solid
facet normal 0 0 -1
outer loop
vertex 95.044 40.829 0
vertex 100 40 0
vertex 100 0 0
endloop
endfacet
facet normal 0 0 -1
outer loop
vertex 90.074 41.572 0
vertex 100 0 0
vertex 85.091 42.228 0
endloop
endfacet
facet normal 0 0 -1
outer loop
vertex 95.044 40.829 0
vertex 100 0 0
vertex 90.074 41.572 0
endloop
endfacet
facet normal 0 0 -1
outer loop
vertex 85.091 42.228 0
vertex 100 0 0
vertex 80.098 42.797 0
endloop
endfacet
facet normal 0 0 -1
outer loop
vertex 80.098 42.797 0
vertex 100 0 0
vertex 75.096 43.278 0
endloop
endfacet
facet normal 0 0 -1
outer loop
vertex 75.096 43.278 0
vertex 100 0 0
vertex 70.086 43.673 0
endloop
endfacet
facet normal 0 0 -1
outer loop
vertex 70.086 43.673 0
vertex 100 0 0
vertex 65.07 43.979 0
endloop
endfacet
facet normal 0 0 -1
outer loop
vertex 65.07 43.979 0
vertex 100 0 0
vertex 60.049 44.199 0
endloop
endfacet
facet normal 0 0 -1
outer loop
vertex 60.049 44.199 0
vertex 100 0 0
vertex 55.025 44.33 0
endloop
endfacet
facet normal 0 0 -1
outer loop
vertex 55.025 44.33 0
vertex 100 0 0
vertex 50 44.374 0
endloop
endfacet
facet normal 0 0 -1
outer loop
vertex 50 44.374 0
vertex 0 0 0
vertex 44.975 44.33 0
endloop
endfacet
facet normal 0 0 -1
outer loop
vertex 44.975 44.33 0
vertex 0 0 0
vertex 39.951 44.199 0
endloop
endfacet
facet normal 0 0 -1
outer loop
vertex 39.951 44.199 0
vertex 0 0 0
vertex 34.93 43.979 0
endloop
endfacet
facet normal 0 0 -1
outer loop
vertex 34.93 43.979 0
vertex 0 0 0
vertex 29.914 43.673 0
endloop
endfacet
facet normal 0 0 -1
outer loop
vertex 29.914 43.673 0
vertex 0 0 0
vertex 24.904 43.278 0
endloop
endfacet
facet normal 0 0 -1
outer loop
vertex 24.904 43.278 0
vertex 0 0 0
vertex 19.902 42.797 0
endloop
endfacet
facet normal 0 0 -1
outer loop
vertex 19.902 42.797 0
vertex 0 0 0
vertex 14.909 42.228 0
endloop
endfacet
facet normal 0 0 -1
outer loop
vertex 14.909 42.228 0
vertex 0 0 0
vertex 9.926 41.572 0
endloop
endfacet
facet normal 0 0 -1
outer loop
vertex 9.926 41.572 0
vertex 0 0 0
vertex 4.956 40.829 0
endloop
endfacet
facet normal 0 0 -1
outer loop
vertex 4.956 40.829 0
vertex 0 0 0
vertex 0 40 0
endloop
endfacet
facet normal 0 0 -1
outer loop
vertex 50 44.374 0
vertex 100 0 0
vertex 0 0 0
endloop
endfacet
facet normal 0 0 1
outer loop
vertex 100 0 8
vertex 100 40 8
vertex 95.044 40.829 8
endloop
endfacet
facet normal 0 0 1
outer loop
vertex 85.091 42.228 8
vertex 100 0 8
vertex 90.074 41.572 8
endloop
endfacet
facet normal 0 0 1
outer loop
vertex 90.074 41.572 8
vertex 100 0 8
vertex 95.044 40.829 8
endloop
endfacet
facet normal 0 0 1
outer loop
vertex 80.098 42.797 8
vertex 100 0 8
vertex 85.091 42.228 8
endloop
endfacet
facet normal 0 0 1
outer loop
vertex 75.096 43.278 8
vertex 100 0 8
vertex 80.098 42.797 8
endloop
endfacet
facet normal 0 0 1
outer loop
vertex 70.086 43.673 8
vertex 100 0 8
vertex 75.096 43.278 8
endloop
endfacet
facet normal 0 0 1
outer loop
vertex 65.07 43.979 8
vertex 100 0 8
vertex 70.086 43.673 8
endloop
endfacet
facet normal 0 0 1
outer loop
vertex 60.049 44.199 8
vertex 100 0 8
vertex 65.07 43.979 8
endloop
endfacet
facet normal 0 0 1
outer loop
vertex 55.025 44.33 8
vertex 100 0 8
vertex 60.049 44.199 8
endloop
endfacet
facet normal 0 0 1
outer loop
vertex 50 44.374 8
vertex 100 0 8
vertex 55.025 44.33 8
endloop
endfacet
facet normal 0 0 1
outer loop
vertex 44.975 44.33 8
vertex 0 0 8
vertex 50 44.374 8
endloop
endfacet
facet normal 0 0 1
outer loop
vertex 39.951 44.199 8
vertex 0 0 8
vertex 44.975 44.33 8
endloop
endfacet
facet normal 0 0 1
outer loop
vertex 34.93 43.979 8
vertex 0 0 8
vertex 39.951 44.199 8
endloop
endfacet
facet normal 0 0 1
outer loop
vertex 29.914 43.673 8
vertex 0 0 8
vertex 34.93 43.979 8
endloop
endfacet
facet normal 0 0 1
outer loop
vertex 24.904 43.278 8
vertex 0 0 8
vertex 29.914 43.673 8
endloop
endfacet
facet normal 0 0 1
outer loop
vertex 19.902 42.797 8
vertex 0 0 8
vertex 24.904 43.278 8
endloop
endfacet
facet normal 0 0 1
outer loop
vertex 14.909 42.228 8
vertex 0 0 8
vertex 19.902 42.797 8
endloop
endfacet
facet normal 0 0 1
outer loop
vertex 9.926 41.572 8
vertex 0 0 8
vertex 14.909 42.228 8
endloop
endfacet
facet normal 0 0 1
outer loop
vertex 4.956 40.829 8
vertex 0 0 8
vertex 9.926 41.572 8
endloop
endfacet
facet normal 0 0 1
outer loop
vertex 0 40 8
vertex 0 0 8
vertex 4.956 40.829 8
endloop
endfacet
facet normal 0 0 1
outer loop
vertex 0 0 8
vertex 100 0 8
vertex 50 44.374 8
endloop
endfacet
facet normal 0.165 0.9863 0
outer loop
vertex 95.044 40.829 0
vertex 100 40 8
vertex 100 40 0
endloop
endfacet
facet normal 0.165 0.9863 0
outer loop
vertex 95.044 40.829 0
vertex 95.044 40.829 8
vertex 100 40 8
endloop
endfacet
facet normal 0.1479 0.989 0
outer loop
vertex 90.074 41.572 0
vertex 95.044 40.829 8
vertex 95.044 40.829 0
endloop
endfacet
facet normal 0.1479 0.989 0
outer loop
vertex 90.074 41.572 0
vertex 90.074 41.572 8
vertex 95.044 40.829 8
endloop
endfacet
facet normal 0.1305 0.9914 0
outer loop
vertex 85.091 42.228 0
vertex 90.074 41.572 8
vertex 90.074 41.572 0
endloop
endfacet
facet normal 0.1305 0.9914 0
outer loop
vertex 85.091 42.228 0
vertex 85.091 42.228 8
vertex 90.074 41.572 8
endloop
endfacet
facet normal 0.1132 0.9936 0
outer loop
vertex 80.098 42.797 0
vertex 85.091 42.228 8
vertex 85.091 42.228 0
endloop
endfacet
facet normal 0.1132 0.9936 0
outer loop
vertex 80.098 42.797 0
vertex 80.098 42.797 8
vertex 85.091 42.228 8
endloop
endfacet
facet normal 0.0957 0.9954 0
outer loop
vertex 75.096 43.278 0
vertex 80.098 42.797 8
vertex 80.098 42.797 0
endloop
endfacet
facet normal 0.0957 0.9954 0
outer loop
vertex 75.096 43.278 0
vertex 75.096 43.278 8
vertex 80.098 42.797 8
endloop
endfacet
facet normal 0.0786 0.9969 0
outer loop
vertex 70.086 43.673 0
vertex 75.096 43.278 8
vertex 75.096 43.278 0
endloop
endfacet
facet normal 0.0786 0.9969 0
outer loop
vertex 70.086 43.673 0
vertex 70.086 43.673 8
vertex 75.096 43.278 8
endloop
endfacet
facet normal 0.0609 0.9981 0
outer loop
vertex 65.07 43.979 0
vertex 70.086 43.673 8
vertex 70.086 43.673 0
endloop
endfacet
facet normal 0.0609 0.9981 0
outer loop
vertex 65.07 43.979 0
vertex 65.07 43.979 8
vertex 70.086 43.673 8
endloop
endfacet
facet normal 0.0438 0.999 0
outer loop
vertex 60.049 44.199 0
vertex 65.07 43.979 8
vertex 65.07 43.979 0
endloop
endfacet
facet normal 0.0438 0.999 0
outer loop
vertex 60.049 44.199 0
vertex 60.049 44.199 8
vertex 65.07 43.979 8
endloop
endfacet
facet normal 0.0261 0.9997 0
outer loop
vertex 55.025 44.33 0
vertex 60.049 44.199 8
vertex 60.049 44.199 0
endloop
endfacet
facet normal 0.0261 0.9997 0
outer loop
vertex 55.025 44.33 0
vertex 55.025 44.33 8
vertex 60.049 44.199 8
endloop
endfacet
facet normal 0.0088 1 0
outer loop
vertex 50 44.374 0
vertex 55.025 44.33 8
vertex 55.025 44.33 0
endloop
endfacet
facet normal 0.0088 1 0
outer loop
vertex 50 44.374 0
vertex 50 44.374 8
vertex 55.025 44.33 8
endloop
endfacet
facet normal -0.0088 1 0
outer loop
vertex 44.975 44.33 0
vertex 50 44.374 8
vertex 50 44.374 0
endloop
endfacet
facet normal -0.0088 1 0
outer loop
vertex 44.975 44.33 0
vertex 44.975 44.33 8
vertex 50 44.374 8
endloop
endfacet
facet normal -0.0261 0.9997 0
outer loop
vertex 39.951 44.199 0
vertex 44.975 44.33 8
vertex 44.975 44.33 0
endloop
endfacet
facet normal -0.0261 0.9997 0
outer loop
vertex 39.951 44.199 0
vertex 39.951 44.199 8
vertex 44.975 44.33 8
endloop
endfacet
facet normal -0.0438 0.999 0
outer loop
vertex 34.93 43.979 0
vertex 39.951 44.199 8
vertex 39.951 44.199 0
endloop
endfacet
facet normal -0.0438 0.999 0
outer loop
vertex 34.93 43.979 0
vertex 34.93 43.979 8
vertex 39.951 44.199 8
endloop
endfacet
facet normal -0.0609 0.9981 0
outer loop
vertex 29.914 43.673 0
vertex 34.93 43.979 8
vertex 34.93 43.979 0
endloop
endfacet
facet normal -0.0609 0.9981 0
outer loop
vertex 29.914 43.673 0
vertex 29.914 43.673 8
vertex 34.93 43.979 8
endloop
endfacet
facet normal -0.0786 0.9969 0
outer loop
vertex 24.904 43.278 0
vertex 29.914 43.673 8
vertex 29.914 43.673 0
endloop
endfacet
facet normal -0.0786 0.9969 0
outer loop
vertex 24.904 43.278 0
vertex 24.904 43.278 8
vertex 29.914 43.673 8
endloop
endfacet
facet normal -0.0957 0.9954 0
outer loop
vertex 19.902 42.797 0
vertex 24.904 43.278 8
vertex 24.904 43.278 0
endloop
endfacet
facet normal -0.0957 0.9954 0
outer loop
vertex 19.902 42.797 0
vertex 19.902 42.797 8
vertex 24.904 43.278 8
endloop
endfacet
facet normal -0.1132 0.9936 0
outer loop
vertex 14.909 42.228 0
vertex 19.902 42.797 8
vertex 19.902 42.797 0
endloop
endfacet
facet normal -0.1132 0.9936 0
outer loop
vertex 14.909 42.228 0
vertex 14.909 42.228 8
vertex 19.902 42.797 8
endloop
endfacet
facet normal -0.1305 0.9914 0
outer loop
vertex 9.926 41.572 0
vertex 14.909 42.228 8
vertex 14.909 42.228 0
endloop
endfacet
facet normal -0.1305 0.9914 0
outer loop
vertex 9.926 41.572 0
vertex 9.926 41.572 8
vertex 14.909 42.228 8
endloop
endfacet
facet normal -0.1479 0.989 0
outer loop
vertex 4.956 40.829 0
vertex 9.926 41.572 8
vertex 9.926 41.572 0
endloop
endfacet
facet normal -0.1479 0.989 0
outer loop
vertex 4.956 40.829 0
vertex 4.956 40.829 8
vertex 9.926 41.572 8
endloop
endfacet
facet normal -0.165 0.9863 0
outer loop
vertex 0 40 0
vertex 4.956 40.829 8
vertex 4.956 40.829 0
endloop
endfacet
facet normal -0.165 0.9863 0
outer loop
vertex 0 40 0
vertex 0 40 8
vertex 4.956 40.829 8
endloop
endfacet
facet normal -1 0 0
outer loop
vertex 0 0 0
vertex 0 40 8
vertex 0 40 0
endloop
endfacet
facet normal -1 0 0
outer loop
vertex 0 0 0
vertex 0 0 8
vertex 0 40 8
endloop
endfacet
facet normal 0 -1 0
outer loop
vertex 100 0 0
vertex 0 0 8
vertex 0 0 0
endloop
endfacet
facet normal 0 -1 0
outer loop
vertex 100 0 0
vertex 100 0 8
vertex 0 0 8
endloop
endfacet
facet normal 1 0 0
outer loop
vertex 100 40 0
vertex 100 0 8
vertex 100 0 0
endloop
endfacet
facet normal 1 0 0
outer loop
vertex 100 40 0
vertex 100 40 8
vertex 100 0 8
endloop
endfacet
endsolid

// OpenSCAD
$fn = 32;

// ----------------------------------------------------------------------
// Arc profile plate: crown, 23 points
// ----------------------------------------------------------------------

// --- parameters (mm) ---
bar_l = 100;              // bar length, X
bar_w = 40;               // bar height at the ends, Y
arc_r = 287.94;           // radius of the crown arc
arc_angle = 20;           // crown arc angle, degrees
crown_rise = 4.37;        // rise of the crown over the ends
arc_step = 1;             // sampling step of the crown arc, degrees
plate_t = 8;              // plate thickness, Z

bbox_y = bar_w + crown_rise;  // full height with the crown

profile = [[100, 40], [95.044, 40.829], [90.074, 41.572], [85.091, 42.228], [80.098, 42.797], [75.096, 43.278], [70.086, 43.673], [65.07, 43.979], [60.049, 44.199], [55.025, 44.33], [50, 44.374], [44.975, 44.33], [39.951, 44.199], [34.93, 43.979], [29.914, 43.673], [24.904, 43.278], [19.902, 42.797], [14.909, 42.228], [9.926, 41.572], [4.956, 40.829], [0, 40], [0, 0], [100, 0]];  // primary outline, 23 points, counter clockwise

// --- the one profile operation ---
linear_extrude(height = plate_t) polygon(points = profile);
